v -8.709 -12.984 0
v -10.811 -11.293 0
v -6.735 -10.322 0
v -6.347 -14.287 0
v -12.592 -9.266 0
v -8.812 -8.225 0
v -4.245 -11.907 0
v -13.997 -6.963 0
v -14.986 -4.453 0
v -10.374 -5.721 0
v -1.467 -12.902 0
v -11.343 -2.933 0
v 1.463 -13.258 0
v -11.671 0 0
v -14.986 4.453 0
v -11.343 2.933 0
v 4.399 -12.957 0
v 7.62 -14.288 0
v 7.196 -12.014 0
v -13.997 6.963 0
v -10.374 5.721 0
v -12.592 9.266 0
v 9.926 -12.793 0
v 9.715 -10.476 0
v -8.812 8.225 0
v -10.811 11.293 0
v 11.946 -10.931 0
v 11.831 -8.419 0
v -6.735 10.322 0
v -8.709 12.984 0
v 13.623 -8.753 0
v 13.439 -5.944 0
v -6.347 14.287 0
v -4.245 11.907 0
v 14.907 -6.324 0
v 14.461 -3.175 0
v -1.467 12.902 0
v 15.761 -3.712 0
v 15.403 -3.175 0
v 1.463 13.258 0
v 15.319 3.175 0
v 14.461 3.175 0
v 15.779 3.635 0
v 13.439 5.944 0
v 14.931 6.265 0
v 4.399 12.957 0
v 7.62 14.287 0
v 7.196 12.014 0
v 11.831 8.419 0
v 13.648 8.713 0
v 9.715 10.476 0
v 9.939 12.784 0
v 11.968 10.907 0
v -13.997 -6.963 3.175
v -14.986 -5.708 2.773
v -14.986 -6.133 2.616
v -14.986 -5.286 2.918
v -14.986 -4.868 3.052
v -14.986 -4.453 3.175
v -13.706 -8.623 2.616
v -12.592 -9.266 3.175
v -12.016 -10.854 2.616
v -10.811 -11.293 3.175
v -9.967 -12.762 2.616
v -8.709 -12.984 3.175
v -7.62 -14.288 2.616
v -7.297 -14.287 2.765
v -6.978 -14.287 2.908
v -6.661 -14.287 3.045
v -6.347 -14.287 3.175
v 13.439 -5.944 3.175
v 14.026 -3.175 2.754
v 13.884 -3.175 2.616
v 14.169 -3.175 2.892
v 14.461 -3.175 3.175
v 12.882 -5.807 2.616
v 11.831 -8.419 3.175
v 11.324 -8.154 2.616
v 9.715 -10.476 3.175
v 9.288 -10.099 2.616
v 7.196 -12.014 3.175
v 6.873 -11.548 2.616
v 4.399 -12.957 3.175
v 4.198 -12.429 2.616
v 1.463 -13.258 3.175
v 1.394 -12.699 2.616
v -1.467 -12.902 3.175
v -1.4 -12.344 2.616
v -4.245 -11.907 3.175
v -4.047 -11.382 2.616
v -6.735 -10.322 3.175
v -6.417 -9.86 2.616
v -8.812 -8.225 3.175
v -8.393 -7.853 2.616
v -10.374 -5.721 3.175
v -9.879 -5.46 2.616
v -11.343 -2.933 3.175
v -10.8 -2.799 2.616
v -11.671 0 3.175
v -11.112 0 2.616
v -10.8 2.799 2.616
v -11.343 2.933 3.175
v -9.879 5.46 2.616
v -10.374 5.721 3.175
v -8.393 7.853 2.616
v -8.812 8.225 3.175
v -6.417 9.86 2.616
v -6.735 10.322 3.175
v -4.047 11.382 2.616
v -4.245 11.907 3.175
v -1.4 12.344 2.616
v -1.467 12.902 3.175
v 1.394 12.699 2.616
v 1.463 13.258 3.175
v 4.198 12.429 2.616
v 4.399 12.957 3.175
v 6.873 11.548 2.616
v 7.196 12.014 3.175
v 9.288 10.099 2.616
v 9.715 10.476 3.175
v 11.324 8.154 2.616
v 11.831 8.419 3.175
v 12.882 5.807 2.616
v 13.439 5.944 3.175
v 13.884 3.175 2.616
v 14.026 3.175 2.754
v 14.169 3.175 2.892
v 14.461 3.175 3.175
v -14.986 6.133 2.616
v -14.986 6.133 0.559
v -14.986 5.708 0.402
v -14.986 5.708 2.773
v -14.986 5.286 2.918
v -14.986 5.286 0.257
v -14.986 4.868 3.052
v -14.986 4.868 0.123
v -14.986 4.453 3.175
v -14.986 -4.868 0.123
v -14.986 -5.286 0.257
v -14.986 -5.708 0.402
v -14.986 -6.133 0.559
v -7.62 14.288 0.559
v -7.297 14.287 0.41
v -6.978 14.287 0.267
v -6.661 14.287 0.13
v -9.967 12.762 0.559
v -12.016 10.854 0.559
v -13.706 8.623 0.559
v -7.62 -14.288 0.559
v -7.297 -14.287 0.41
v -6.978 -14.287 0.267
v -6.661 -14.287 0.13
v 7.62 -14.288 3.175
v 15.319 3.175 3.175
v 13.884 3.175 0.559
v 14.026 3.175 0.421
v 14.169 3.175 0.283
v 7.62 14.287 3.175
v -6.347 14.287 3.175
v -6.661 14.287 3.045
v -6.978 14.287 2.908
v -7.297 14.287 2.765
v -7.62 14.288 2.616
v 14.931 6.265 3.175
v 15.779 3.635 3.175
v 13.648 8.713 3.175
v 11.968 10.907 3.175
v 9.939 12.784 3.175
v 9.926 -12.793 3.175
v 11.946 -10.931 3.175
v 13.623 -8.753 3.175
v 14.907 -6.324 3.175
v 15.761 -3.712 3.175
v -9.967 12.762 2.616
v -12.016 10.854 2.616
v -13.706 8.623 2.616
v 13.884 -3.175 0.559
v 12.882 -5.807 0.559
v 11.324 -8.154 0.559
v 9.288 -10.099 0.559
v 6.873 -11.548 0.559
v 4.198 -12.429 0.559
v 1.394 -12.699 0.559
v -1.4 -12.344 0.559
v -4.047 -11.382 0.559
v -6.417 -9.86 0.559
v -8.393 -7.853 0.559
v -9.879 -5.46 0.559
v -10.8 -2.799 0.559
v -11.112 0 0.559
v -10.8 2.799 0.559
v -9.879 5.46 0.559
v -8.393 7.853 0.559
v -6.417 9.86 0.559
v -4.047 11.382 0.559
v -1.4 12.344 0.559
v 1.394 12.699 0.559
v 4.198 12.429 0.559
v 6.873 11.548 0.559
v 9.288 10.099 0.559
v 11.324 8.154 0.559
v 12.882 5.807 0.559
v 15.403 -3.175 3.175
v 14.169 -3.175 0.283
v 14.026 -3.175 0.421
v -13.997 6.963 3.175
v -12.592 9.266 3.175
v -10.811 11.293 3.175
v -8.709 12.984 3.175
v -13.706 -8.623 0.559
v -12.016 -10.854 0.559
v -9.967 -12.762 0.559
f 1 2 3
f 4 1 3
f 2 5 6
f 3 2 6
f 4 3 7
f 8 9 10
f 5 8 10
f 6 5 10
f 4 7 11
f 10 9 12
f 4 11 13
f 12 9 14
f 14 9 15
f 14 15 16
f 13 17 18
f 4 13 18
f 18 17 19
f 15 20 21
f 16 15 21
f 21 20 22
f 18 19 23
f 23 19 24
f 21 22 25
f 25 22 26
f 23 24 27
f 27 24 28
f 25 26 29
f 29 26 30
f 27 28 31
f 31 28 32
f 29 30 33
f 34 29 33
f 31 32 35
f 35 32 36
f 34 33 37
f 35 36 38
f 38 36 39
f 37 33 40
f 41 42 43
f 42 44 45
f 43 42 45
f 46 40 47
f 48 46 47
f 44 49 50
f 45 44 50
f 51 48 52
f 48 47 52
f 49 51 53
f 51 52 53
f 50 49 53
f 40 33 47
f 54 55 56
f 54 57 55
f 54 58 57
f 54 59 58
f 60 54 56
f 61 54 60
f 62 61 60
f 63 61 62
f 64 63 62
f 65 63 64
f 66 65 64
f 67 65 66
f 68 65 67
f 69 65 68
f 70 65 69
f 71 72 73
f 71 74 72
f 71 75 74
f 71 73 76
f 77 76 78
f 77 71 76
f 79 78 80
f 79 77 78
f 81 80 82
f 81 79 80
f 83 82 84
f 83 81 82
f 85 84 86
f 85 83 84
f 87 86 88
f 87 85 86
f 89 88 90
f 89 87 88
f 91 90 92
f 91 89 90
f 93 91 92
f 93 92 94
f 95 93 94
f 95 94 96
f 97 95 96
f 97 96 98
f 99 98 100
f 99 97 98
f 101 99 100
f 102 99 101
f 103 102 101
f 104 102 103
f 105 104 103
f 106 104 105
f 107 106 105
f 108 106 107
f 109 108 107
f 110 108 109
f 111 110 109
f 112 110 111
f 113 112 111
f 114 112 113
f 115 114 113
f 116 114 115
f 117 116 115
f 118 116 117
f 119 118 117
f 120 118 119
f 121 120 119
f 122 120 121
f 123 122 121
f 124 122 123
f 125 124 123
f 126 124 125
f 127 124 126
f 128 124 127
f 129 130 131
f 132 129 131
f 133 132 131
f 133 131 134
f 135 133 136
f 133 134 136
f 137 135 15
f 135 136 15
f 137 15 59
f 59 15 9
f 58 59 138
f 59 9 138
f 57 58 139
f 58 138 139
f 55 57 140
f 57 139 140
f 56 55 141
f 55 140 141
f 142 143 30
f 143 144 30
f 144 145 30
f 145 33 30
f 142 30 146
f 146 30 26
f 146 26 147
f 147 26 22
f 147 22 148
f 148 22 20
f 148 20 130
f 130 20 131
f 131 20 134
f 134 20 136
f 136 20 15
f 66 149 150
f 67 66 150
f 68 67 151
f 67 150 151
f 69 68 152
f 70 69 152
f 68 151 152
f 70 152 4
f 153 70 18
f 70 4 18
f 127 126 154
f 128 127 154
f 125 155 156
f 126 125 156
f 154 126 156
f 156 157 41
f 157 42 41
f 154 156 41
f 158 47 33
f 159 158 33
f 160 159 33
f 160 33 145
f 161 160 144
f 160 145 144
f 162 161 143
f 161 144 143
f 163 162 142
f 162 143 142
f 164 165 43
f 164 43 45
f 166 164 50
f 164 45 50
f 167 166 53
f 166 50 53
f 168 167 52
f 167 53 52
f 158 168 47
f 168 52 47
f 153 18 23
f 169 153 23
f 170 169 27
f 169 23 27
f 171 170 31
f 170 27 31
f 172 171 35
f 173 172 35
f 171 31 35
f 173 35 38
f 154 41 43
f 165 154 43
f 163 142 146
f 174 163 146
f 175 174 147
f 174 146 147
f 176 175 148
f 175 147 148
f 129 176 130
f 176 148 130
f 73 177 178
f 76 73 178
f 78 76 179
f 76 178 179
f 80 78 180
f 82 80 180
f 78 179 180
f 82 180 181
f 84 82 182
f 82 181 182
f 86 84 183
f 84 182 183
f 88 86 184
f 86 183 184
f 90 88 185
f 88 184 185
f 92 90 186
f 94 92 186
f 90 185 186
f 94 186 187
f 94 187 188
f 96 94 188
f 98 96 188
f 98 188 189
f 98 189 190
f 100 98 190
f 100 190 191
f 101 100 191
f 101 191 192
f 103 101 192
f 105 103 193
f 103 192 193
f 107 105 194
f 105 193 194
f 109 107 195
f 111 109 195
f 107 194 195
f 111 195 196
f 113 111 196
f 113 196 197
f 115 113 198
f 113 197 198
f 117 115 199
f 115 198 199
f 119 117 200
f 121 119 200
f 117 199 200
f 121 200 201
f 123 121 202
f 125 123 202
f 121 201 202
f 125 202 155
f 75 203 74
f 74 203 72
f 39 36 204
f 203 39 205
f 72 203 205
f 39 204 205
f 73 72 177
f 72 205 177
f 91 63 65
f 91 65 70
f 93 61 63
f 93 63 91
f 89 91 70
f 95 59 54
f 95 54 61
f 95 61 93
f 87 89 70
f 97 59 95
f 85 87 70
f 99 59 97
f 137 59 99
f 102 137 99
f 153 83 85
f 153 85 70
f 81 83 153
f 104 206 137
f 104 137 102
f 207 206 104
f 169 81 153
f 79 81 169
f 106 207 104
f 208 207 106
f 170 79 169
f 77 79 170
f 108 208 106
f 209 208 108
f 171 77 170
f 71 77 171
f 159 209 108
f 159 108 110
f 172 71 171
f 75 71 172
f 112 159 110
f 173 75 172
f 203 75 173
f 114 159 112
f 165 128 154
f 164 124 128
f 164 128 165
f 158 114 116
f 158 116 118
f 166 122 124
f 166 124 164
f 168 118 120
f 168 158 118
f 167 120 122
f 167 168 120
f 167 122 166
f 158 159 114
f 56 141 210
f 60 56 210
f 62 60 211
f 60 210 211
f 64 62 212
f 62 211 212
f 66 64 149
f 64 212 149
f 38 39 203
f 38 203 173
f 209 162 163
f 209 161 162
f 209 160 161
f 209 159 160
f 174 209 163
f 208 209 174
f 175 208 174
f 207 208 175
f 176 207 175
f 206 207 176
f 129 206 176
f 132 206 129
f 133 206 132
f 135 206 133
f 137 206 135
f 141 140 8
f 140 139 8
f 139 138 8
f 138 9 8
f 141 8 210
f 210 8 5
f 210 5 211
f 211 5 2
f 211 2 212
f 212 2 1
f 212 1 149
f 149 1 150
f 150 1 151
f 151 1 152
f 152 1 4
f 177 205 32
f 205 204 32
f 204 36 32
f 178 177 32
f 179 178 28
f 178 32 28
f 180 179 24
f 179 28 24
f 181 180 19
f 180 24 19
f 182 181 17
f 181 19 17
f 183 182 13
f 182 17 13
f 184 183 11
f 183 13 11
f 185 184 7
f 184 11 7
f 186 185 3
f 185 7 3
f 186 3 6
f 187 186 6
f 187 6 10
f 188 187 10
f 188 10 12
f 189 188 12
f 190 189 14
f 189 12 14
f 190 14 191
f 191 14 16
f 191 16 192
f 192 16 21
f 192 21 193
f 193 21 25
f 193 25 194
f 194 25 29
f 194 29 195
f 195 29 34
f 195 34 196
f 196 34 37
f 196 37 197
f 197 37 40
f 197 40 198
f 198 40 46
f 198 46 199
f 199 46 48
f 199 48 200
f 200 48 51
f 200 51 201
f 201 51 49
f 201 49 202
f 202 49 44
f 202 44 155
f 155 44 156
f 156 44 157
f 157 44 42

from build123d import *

# Parameters (mm, degrees)
BOSS_EXTRUDE1_DEPTH = 3.175
CHAMFER1_SIZE       = 0.5588
CHAMFER2_SIZE       = 0.5588
CHAMFER2_SIZE_2     = 0.474900858


with BuildPart() as part:
    # Sketch1 → Boss-Extrude1 (new body)
    with BuildSketch(Plane.XY):
        with BuildLine():
            Line((13.884222124, 3.175), (15.878174683, 3.175))
            ThreePointArc((15.878174683, 3.175), (12.996652162, 9.65836885), (7.62, 14.2875))
            Line((7.62, 14.2875), (-7.62, 14.2875))
            ThreePointArc((-7.62, 14.2875), (-12.015852965, 10.854323276), (-14.986, 6.133258534))
            Line((-14.986, 6.133258534), (-14.986, -6.133258534))
            ThreePointArc((-14.986, -6.133258534), (-12.015852965, -10.854323276), (-7.62, -14.2875))
            Line((-7.62, -14.2875), (7.62, -14.2875))
            ThreePointArc((7.62, -14.2875), (12.996652162, -9.65836885), (15.878174683, -3.175))
            Line((15.878174683, -3.175), (13.884222124, -3.175))
            ThreePointArc((13.884222124, -3.175), (-11.1125, 0), (13.884222124, 3.175))
        make_face()
    extrude(amount=BOSS_EXTRUDE1_DEPTH)

    # Chamfer1
    chamfer1_edges = [part.edges().sort_by_distance(p)[0] for p in [
        (-11.1125, 0, 0),
        (-12.015852965, -10.854323276, 0),
        (-12.015852965, 10.854323276, 0),
        (-12.015852965, -10.854323276, 3.175),
        (-11.1125, 0, 3.175),
        (-12.015852965, 10.854323276, 3.175),
    ]]
    chamfer(chamfer1_edges, length=CHAMFER1_SIZE)

    # Chamfer2
    # the kernel refuses this chamfer: 0.5588, 0.474900858 mm, written as the material it takes off along each edge
    with BuildSketch(Plane(origin=(15.878174683, 3.175, -1.437056454), x_dir=(-1, 0, 0), z_dir=(0, 0, 1))) as chamfer2_piece_1:
        with BuildLine():
            Line((CHAMFER2_SIZE, 0), (0.098924499, -0.459875501))
            ThreePointArc((0.098924499, -0.459875501), (0.04906799, -0.236222299), (0, 0))
            Line((0, 0), (CHAMFER2_SIZE, 0))
        make_face()
    extrude(amount=6.049112907, mode=Mode.SUBTRACT)
    with BuildSketch(Plane(origin=(15.878174683, -3.175, -1.413292003), x_dir=(-1, 0, 0), z_dir=(0, 0, 1))) as chamfer2_piece_2:
        with BuildLine():
            Line((CHAMFER2_SIZE_2, 0), (0.116884641, 0.536979589))
            ThreePointArc((0.116884641, 0.536979589), (0.057817387, 0.276572291), (0, 0))
            Line((0, 0), (CHAMFER2_SIZE_2, 0))
        make_face()
    extrude(amount=6.001584006, mode=Mode.SUBTRACT)


solid = part.part
